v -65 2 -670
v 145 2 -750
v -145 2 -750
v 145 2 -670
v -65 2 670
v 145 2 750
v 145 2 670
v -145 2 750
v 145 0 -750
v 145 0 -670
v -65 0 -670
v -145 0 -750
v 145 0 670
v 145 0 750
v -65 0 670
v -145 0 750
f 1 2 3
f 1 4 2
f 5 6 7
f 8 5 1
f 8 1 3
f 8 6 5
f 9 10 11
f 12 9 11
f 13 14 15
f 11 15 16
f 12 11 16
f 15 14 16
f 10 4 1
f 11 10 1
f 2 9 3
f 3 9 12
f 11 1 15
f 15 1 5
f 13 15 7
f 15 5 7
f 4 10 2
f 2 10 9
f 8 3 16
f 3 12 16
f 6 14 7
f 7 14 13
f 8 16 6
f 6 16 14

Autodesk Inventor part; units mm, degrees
ref_plane "YZ Plane" through (0, 0, 0) normal (1, 0, 0) x (0, 1, 0)
ref_plane "XZ Plane" through (0, 0, 0) normal (0, 1, 0) x (-1, 0, 0)
ref_plane "XY Plane" through (0, 0, 0) normal (0, 0, 1) x (1, 0, 0)
sketch "スケッチ1" plane through (0, 0, 0) normal (0, 1, 0) x (-1, 0, 0)
  line L0 (-145, -750) -> (145, -750)
  line L1 (145, -750) -> (145, 750)
  line L2 (145, 750) -> (-145, 750)
  line L3 (-145, 750) -> (-145, -750)
  line L4 (-145, -750) -> (145, 750) construction
  line L5 (145, -750) -> (-145, 750) construction
  point P0 (0, 0)
  dimension "d0" = 1500
  dimension "d1" = 290
extrude "押し出し1" add sketch "スケッチ1" along normal blind 2
sketch "スケッチ2" plane through (0, 2, 0) normal (0, 1, 0) x (1, 0, 0)
  line L0 (355, 670) -> (-65, 670)
  line L1 (-65, 670) -> (-65, -670)
  line L2 (-65, -670) -> (355, -670)
  line L3 (355, -670) -> (355, 670)
  line L4 (145, -750) -> (145, 750) projected
  line L5 (355, 670) -> (-65, -670) construction
  line L6 (-65, 670) -> (355, -670) construction
  line L7 (-145, -750) -> (145, -750) projected
  line L8 (-145, 750) -> (-145, -750) projected
  point P0 (0, 0)
  point P1 (145, 0)
  point P2 (145, -670)
  point P3 (145, 670)
  dimension "d4" = 80
  dimension "d5" = 80
extrude "押し出し2" cut sketch "スケッチ2" against normal blind 10 contours L4 L2 L1 L0
properties part number "Panel_E" material "アルミニウム 6061"
